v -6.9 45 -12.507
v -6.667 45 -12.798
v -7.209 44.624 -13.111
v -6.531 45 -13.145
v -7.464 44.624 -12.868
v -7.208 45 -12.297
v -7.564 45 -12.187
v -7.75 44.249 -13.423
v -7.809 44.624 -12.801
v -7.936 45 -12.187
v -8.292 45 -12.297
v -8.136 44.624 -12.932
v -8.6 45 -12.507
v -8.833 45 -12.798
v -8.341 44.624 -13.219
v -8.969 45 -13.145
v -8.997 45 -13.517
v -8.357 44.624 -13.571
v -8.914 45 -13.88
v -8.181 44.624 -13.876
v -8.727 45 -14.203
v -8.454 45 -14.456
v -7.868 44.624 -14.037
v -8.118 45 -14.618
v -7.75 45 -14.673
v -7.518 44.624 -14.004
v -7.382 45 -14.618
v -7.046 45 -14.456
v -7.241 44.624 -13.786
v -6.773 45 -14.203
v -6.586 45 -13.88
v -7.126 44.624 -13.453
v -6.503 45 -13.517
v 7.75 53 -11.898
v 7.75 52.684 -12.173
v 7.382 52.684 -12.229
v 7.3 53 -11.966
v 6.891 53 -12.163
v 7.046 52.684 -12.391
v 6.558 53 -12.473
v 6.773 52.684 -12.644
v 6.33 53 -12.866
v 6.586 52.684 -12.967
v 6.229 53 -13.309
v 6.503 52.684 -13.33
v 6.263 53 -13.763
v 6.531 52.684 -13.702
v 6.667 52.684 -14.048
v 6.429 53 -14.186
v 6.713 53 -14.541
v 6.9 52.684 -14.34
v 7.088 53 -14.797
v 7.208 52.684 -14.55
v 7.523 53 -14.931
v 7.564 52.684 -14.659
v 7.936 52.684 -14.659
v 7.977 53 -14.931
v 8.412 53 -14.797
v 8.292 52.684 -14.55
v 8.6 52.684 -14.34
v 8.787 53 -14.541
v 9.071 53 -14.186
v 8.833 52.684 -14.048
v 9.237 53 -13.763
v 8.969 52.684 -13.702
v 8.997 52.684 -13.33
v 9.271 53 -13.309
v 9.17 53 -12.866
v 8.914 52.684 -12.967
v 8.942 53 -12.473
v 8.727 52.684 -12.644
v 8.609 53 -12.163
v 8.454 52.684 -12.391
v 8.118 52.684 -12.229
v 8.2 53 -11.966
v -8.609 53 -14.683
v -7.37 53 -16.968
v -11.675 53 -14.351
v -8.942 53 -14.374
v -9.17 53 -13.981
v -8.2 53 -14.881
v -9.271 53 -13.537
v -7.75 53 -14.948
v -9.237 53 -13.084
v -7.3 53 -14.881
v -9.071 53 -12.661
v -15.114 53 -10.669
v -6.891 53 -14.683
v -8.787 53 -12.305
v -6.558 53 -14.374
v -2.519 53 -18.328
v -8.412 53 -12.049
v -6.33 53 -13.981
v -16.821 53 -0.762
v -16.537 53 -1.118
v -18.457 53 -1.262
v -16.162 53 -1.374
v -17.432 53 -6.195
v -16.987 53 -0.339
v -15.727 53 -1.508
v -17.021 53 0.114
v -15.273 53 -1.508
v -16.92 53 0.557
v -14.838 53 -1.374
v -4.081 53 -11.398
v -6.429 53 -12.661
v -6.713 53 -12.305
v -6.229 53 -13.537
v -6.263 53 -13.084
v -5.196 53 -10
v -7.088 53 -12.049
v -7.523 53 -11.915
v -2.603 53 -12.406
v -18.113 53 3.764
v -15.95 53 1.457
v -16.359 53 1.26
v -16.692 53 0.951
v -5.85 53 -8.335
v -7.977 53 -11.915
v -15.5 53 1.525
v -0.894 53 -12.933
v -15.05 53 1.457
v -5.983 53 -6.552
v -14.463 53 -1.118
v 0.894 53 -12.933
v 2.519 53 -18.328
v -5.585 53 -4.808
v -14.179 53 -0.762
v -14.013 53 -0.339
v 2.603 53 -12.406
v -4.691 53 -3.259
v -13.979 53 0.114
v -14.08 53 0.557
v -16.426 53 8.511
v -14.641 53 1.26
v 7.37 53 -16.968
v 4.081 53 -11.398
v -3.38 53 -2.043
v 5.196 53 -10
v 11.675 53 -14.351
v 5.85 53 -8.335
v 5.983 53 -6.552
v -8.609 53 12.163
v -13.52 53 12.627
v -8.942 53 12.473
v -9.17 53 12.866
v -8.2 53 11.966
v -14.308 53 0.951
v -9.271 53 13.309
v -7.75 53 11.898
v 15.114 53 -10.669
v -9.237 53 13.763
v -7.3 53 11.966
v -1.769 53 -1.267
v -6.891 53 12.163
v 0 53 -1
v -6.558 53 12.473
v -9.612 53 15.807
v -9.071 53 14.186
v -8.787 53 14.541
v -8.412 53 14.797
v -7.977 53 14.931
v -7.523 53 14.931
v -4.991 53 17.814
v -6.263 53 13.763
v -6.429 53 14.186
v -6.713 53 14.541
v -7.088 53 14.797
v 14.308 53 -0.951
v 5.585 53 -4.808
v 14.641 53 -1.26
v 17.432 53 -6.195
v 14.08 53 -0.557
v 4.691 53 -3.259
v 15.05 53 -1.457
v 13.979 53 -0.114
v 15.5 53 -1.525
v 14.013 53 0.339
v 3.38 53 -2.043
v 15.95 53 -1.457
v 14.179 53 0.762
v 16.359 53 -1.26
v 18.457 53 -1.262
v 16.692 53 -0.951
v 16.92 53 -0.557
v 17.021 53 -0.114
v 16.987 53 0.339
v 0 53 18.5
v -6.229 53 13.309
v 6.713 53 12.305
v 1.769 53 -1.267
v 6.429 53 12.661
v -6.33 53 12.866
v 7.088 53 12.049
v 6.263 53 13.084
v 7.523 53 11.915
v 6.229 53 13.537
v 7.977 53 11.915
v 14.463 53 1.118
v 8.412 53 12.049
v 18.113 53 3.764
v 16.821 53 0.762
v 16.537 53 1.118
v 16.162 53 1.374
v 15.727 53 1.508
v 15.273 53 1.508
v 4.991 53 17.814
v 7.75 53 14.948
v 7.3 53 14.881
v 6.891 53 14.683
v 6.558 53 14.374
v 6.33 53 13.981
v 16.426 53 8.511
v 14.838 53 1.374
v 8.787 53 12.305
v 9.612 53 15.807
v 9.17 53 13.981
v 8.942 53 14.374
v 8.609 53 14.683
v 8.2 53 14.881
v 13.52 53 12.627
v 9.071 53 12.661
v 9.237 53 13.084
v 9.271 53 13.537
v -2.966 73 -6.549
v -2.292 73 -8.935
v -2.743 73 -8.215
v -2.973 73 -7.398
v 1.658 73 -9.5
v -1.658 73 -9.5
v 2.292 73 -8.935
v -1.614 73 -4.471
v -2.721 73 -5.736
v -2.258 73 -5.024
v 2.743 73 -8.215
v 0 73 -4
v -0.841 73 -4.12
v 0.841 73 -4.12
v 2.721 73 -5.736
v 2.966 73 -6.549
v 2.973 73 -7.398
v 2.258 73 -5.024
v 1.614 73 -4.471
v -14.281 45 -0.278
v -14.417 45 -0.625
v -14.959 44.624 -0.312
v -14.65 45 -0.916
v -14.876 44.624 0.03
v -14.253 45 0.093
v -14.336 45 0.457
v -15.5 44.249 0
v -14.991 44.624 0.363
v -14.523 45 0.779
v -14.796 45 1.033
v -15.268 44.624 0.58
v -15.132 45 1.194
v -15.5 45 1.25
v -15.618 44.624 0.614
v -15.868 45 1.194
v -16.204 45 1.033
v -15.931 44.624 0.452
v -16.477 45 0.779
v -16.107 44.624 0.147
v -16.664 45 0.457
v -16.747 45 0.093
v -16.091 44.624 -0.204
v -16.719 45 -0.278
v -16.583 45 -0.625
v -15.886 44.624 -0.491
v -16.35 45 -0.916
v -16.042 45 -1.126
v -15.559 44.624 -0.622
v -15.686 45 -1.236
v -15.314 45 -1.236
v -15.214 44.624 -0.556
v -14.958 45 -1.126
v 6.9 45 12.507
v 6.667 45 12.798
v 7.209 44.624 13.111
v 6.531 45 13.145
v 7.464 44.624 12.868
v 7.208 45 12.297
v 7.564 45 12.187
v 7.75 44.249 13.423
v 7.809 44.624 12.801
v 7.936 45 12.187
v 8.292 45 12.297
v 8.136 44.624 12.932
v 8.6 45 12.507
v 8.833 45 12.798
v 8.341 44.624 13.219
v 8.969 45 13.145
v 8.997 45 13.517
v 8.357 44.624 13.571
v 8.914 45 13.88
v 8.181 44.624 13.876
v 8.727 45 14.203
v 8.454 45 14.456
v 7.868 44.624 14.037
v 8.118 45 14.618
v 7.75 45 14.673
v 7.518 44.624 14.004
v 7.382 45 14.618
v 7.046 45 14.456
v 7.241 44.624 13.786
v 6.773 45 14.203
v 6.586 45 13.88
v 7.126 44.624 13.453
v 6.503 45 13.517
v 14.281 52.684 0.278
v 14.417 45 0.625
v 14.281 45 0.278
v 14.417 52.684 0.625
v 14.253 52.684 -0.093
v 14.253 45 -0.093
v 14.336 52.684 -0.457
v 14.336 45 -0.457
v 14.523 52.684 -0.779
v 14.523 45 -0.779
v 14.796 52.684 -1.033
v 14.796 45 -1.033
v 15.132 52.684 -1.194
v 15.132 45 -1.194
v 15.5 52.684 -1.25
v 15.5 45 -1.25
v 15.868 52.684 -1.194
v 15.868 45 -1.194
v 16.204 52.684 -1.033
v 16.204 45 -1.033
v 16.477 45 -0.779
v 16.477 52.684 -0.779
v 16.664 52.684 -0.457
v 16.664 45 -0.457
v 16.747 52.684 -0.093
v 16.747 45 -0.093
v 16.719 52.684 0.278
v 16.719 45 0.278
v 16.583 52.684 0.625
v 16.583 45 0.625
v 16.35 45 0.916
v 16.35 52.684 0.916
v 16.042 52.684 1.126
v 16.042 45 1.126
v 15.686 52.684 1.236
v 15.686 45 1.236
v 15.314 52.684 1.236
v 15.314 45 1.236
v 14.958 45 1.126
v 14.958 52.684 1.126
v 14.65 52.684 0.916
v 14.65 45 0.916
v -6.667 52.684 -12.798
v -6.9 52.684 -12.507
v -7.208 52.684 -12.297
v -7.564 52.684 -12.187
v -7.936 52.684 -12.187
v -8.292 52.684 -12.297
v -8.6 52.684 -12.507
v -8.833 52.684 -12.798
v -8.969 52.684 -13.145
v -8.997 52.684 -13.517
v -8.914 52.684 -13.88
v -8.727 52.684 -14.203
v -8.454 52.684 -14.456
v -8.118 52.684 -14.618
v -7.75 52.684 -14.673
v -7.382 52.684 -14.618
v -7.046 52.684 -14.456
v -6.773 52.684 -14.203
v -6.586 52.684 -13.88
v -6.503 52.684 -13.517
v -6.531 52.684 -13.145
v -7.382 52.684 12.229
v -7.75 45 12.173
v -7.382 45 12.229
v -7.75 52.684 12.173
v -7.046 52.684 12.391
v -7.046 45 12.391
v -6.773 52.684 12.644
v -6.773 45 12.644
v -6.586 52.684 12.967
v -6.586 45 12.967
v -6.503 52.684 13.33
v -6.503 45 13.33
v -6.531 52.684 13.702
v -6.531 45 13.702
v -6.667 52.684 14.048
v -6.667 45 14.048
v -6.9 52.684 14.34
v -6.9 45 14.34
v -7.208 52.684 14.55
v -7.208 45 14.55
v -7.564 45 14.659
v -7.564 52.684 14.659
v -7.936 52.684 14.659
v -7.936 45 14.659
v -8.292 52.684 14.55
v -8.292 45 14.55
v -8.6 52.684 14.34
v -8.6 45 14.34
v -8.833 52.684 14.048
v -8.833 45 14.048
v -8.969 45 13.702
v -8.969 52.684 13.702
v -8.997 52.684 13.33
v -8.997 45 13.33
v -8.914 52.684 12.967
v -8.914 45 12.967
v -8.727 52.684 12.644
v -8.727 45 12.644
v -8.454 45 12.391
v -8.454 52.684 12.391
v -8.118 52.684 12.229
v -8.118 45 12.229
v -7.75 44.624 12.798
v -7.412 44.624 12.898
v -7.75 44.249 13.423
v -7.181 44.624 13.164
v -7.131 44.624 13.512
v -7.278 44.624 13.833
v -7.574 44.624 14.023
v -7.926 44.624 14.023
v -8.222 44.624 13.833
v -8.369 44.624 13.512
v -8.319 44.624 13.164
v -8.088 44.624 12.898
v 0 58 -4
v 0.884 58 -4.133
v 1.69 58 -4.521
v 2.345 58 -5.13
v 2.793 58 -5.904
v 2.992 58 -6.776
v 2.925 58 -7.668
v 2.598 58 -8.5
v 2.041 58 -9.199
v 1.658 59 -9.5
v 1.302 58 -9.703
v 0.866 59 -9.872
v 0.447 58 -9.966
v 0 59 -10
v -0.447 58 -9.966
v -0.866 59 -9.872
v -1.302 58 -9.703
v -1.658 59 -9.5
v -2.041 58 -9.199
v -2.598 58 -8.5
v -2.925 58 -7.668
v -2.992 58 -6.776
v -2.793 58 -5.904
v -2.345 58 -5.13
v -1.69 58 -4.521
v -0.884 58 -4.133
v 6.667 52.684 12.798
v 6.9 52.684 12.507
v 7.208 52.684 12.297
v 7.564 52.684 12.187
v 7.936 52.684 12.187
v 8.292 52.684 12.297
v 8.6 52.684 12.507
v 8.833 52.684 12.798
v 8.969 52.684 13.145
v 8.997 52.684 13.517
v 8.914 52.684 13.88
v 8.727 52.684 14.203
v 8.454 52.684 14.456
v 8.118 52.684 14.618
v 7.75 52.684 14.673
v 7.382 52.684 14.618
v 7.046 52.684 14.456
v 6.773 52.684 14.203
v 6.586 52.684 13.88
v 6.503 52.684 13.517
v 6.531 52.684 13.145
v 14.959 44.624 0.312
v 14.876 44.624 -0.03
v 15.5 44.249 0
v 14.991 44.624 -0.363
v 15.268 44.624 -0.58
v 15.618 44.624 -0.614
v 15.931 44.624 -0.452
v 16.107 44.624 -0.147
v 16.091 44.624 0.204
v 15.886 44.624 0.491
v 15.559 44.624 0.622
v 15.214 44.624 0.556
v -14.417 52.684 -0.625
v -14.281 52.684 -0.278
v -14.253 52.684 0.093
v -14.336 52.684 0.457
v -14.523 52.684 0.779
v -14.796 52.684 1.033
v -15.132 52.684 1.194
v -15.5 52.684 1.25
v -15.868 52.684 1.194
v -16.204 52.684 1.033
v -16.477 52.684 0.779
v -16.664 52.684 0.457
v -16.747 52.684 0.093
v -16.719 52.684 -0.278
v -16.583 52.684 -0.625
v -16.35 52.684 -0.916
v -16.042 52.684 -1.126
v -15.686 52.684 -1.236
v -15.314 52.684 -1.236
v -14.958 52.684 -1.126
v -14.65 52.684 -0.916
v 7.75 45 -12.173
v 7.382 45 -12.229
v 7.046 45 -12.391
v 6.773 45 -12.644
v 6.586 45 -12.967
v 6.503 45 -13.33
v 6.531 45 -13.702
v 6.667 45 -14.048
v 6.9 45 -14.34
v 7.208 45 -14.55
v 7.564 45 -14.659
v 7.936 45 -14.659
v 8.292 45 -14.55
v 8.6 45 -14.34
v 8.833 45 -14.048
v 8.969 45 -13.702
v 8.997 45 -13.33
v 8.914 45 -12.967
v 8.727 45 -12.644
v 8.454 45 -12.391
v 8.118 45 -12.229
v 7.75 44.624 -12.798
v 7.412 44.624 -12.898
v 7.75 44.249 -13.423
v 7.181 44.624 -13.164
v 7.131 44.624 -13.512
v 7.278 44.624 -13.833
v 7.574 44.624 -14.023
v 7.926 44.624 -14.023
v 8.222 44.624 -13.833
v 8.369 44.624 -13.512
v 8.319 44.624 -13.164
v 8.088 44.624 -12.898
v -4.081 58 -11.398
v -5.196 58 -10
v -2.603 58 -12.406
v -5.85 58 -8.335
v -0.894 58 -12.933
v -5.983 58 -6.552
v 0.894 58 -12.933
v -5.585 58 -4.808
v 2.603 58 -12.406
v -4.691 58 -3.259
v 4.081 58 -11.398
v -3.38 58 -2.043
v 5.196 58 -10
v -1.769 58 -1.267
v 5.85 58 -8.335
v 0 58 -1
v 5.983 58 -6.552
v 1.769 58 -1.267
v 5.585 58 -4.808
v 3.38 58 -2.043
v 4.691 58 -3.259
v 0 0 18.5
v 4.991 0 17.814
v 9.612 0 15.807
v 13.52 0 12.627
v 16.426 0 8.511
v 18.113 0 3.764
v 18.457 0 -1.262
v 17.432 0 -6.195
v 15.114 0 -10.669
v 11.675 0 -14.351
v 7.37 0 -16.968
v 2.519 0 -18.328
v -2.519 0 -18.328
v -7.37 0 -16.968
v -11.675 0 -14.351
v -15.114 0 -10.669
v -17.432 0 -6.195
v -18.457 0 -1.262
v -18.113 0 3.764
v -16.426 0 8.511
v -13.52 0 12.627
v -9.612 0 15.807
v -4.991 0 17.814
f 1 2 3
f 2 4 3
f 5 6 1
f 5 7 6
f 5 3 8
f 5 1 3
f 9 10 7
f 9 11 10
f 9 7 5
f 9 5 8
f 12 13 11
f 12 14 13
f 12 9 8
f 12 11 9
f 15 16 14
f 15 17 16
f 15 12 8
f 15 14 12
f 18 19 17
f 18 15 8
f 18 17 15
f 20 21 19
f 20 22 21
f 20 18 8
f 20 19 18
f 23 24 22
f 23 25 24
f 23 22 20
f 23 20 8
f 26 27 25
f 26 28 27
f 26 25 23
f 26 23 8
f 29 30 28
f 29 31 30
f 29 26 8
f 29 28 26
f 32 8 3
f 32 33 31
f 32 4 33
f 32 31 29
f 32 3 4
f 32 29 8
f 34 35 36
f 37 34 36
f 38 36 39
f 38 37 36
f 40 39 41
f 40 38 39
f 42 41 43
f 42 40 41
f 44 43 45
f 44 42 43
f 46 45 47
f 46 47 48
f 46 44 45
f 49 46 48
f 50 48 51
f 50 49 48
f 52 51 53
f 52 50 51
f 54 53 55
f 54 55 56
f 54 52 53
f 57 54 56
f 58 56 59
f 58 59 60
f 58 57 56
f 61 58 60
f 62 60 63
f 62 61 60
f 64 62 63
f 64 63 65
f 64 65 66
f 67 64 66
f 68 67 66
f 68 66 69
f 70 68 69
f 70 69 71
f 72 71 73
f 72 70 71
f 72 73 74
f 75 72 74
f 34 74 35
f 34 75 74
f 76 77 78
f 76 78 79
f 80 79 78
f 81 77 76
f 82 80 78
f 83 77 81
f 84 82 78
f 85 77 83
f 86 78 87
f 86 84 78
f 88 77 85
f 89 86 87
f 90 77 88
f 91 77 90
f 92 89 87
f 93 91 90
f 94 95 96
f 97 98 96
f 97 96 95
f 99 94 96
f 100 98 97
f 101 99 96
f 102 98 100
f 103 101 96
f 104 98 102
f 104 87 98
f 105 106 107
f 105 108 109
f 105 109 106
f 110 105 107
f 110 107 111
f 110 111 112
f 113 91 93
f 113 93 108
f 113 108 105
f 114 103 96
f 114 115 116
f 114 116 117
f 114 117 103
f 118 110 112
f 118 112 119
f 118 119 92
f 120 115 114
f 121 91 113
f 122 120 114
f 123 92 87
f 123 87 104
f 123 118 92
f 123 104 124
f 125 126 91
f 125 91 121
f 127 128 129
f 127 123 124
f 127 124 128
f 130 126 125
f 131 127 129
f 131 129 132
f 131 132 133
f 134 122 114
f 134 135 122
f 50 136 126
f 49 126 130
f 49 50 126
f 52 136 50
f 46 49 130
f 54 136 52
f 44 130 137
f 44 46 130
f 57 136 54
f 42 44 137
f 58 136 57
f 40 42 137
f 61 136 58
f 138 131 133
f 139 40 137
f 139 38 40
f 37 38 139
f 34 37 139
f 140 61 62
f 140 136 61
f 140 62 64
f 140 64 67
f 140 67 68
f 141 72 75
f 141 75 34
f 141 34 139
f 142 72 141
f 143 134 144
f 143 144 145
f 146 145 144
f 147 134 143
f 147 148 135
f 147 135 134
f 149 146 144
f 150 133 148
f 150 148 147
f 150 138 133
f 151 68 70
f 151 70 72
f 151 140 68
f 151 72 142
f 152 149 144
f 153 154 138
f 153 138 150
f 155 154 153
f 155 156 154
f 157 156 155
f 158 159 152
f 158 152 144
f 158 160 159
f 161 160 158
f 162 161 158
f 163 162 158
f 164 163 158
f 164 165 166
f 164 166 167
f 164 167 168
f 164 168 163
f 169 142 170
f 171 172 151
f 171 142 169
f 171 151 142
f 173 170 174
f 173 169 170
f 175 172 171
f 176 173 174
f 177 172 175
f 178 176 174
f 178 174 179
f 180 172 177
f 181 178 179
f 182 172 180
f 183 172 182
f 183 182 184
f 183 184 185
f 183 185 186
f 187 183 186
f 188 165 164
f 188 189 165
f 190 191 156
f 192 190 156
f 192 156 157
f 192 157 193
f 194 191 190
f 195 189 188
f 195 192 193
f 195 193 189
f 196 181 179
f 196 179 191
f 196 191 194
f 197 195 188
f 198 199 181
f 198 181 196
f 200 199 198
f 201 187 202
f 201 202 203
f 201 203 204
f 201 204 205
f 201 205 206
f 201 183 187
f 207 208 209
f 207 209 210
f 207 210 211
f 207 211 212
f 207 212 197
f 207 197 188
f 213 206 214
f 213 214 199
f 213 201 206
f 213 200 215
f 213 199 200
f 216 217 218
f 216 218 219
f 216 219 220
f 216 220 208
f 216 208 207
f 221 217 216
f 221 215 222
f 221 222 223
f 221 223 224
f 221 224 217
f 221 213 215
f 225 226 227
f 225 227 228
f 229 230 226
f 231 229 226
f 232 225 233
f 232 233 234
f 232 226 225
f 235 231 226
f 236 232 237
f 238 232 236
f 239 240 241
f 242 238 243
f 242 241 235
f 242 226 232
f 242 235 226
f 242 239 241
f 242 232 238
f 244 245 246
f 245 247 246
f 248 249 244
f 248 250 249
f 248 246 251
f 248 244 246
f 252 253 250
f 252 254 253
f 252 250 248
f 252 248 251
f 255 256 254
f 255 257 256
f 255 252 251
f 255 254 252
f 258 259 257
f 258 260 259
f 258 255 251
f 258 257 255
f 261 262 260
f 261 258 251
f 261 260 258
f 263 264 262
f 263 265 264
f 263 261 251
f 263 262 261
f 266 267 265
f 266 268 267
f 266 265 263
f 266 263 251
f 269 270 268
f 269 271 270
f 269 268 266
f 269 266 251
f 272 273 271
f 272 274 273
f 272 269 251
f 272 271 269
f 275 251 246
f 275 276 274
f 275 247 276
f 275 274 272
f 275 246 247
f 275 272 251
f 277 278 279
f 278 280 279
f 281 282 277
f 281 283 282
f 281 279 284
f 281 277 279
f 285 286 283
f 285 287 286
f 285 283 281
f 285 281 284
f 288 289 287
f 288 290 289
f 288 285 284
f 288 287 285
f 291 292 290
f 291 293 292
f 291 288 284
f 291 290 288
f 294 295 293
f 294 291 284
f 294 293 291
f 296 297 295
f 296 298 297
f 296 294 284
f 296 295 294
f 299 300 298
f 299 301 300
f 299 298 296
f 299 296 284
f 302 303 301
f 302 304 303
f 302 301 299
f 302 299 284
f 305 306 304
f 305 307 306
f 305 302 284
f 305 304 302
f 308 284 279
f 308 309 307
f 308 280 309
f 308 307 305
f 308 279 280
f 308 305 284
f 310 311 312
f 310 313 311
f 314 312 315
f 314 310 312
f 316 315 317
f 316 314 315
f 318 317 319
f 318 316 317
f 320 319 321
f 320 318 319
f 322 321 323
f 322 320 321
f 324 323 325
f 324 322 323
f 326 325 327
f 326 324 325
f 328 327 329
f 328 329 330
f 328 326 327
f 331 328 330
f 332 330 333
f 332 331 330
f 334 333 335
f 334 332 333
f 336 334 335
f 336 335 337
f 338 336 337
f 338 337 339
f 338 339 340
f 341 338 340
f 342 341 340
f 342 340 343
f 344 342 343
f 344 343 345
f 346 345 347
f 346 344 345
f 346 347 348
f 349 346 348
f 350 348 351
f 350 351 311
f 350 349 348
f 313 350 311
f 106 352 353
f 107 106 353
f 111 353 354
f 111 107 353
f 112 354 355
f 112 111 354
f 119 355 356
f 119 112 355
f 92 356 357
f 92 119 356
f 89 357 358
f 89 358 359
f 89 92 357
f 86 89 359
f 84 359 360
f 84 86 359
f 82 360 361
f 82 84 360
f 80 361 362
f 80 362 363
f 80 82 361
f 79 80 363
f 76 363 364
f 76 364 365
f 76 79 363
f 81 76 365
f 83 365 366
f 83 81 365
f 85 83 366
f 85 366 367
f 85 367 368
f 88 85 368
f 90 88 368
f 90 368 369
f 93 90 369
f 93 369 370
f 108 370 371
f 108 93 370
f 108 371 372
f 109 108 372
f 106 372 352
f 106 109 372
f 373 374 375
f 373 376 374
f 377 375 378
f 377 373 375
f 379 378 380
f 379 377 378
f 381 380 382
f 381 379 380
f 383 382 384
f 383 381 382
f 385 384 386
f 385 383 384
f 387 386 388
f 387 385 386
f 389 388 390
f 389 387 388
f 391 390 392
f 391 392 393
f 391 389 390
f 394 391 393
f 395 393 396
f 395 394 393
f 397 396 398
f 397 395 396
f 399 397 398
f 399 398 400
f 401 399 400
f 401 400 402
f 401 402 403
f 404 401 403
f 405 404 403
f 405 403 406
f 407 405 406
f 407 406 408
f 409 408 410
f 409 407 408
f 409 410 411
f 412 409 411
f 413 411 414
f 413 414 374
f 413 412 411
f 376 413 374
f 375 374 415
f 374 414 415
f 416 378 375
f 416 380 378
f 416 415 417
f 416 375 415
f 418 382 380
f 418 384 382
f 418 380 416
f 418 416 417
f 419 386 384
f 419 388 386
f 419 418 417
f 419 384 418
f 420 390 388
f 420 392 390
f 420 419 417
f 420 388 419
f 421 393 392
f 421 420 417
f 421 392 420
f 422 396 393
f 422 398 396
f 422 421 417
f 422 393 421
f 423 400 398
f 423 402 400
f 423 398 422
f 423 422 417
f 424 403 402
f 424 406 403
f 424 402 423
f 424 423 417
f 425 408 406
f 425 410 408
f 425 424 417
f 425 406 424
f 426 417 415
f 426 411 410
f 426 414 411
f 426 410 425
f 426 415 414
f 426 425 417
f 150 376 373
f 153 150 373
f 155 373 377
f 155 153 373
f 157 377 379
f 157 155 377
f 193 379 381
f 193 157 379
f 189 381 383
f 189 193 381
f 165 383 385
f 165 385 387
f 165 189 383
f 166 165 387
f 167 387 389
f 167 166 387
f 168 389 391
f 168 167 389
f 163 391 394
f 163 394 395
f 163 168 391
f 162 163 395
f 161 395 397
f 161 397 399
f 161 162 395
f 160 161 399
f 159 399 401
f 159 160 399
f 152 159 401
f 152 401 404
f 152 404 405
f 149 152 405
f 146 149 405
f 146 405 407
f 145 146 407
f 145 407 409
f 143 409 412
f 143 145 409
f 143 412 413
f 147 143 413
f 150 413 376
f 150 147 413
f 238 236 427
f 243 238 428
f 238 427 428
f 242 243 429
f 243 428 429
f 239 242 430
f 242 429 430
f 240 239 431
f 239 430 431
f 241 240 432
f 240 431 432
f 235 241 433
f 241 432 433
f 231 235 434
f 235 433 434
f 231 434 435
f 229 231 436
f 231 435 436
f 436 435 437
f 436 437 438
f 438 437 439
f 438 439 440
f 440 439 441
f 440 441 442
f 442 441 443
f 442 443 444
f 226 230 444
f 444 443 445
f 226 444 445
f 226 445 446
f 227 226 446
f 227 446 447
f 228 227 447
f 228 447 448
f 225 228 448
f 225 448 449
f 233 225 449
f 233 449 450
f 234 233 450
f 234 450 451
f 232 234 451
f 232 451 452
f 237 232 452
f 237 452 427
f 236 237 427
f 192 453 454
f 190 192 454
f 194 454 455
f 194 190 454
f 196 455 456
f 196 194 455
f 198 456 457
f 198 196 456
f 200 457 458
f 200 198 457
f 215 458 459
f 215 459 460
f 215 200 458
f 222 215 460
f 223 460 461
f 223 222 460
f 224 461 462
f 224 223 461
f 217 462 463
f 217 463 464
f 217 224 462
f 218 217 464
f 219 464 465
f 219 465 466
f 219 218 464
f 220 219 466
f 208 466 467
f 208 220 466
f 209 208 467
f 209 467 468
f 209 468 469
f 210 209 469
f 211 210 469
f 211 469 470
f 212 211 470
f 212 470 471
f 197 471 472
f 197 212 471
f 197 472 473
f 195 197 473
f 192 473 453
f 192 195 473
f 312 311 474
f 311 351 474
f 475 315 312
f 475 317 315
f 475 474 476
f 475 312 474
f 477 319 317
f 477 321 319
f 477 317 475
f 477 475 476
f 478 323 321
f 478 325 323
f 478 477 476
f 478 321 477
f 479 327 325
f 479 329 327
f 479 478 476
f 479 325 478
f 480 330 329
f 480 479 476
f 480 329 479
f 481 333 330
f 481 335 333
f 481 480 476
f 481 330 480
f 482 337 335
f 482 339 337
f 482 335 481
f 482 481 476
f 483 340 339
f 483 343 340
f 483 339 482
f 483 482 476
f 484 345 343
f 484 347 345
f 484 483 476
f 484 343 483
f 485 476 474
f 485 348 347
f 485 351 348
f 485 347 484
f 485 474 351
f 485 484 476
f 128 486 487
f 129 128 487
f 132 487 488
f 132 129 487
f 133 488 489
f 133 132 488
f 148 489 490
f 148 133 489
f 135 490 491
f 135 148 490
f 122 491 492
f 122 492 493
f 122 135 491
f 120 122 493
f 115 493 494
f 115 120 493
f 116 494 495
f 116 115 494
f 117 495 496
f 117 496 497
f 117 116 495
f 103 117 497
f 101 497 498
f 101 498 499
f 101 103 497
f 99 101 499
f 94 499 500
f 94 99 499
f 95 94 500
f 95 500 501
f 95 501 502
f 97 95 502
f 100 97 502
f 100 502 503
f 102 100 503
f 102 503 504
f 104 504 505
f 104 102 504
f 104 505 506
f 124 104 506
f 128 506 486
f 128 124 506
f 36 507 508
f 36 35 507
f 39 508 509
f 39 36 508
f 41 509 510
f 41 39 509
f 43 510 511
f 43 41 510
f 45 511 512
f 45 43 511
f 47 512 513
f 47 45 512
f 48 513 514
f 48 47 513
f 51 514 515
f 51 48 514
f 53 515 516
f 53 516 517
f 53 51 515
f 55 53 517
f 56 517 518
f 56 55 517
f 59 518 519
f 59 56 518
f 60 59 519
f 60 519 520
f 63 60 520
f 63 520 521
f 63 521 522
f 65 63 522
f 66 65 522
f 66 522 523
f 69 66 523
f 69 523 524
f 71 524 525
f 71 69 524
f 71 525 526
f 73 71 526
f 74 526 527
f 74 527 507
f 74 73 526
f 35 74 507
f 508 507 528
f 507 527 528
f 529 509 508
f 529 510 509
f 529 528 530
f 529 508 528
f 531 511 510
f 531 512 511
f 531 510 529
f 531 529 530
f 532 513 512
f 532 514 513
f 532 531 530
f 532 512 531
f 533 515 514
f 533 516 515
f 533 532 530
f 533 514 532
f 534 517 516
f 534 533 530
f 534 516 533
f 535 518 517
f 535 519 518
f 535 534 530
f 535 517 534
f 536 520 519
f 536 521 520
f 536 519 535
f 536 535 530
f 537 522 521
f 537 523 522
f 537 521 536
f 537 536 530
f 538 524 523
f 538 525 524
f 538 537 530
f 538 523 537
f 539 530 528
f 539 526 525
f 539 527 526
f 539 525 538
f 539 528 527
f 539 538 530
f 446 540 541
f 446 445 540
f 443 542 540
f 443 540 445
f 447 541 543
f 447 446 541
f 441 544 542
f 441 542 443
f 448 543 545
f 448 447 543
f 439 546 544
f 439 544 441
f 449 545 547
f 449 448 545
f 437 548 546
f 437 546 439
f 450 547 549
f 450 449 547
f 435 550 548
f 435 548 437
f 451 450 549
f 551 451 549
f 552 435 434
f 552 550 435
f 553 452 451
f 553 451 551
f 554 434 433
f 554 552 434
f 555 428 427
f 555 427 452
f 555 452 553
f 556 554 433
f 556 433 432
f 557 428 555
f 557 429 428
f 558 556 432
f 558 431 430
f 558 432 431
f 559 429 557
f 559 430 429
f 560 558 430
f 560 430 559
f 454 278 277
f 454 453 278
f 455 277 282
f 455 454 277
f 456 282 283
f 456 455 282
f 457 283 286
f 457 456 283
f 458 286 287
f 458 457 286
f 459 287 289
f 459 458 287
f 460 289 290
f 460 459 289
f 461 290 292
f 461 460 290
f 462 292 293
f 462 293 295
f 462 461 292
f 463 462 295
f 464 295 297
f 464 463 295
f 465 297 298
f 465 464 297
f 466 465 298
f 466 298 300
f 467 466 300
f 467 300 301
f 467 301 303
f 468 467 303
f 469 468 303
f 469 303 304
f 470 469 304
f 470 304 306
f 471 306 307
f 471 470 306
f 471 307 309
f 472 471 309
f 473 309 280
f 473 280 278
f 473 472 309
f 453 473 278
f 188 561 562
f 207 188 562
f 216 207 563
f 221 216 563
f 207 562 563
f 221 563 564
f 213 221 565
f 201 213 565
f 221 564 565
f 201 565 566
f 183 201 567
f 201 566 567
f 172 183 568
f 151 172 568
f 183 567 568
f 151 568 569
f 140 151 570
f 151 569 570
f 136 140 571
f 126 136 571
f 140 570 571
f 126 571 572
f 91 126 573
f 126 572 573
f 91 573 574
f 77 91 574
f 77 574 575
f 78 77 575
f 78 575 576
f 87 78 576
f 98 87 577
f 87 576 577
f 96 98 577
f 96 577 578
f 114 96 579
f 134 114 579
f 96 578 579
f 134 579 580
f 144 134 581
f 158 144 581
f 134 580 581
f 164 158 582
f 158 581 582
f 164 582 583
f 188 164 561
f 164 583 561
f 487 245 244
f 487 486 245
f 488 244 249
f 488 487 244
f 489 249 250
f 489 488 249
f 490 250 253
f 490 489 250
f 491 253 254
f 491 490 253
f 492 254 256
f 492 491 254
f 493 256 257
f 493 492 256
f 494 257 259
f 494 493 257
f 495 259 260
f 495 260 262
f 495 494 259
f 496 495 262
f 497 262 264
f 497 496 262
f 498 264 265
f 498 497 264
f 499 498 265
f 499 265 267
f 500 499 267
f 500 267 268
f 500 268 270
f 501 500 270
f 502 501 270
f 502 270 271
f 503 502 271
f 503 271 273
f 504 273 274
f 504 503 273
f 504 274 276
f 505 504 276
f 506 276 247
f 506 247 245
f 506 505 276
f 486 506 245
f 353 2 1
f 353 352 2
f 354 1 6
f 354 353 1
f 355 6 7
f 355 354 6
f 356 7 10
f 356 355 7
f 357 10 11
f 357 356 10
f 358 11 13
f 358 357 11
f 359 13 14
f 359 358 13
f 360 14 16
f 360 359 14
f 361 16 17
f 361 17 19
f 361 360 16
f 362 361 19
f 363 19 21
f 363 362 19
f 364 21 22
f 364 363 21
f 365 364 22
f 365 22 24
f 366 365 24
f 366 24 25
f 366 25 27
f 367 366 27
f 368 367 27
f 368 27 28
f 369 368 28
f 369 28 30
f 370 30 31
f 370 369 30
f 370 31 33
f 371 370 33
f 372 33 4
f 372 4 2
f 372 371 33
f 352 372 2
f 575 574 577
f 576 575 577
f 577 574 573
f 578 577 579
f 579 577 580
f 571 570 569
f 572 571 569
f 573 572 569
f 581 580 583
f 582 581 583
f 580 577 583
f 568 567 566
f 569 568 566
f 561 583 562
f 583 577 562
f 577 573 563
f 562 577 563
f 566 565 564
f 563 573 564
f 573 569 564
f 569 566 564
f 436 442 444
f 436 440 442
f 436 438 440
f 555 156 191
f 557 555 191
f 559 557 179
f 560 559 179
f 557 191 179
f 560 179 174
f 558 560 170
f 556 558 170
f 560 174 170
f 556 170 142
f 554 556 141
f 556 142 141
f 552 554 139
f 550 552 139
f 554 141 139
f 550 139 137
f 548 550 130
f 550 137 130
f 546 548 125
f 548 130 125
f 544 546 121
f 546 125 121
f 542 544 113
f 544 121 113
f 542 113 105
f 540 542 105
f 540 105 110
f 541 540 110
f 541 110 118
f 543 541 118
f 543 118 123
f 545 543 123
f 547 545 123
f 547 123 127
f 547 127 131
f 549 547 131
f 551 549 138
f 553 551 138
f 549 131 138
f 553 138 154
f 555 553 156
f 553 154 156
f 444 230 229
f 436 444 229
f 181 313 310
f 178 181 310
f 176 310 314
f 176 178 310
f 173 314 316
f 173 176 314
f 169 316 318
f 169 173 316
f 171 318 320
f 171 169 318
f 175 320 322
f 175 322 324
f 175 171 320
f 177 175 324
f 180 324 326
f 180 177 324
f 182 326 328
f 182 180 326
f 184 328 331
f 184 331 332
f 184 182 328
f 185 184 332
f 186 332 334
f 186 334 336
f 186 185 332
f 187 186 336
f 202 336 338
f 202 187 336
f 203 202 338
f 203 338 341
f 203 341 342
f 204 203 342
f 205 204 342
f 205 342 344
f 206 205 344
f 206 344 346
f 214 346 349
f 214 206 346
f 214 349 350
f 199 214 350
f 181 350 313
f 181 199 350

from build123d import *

# Parameters (mm, degrees)
SKETCH1_R           = 18.5
BOSS_EXTRUDE1_DEPTH = 53
SKETCH2_R           = 6
SKETCH2_R_2         = 3
BOSS_EXTRUDE2_DEPTH = 5
SKETCH2_3_R         = 3
BOSS_EXTRUDE3_DEPTH = 20
SKETCH4_W           = 9.457424045
SKETCH4_H           = 2.618978966
CUT_EXTRUDE1_DEPTH  = 14
CIRPATTERN1_COUNT   = 6


with BuildPart() as part:
    # Sketch1 → Boss-Extrude1 (new body)
    with BuildSketch(Plane(origin=(0, 0, 0), x_dir=(1, 0, 0), z_dir=(0, 1, 0))):
        Circle(SKETCH1_R)
    extrude(amount=BOSS_EXTRUDE1_DEPTH)

    # Sketch2 → Boss-Extrude2 (add)
    with BuildSketch(Plane(origin=(0, 53, 0), x_dir=(1, 0, 0), z_dir=(0, 1, 0))):
        with Locations((0, 7)):
            Circle(SKETCH2_R)
        with Locations((0, 7)):
            Circle(SKETCH2_R_2, mode=Mode.SUBTRACT)
    extrude(amount=BOSS_EXTRUDE2_DEPTH)

    # Sketch2<3> → Boss-Extrude3 (add)
    with BuildSketch(Plane(origin=(0, 53, 0), x_dir=(1, 0, 0), z_dir=(0, 1, 0))):
        with Locations((0, 7)):
            Circle(SKETCH2_3_R)
    extrude(amount=BOSS_EXTRUDE3_DEPTH)

    # Sketch4 → Cut-Extrude1 (cut)
    with BuildSketch(Plane(origin=(0, 73, 0), x_dir=(1, 0, 0), z_dir=(0, 1, 0))):
        with Locations((0.928983292, 10.809489483)):
            Rectangle(SKETCH4_W, SKETCH4_H)
    extrude(amount=-CUT_EXTRUDE1_DEPTH, mode=Mode.SUBTRACT)

    # Sketch7 → M3x0.5 Tapped Hole1 (revolve, cut)
    with BuildSketch(Plane(origin=(7.75, 53, -13.423393759), x_dir=(0, 0, 1), z_dir=(1, 0, 0))):
        Polygon((0, 0), (0, 8.751075774), (1.25, 8), (1.25, 0.316351312), (1.525, 0), align=None)
    m3x0_5_tapped_hole1 = revolve(axis=Axis((7.75, 59.35, -13.423393759), (0, -1, 0)), mode=Mode.SUBTRACT)

    # CirPattern1: M3x0.5 Tapped Hole1 ×6 about axis
    cirpattern1_axis = Axis((0, 53, 0), (0, 1, 0))
    for i in range(1, CIRPATTERN1_COUNT):
        add(m3x0_5_tapped_hole1.rotate(cirpattern1_axis, i * 360 / CIRPATTERN1_COUNT), mode=Mode.SUBTRACT)


solid = part.part
